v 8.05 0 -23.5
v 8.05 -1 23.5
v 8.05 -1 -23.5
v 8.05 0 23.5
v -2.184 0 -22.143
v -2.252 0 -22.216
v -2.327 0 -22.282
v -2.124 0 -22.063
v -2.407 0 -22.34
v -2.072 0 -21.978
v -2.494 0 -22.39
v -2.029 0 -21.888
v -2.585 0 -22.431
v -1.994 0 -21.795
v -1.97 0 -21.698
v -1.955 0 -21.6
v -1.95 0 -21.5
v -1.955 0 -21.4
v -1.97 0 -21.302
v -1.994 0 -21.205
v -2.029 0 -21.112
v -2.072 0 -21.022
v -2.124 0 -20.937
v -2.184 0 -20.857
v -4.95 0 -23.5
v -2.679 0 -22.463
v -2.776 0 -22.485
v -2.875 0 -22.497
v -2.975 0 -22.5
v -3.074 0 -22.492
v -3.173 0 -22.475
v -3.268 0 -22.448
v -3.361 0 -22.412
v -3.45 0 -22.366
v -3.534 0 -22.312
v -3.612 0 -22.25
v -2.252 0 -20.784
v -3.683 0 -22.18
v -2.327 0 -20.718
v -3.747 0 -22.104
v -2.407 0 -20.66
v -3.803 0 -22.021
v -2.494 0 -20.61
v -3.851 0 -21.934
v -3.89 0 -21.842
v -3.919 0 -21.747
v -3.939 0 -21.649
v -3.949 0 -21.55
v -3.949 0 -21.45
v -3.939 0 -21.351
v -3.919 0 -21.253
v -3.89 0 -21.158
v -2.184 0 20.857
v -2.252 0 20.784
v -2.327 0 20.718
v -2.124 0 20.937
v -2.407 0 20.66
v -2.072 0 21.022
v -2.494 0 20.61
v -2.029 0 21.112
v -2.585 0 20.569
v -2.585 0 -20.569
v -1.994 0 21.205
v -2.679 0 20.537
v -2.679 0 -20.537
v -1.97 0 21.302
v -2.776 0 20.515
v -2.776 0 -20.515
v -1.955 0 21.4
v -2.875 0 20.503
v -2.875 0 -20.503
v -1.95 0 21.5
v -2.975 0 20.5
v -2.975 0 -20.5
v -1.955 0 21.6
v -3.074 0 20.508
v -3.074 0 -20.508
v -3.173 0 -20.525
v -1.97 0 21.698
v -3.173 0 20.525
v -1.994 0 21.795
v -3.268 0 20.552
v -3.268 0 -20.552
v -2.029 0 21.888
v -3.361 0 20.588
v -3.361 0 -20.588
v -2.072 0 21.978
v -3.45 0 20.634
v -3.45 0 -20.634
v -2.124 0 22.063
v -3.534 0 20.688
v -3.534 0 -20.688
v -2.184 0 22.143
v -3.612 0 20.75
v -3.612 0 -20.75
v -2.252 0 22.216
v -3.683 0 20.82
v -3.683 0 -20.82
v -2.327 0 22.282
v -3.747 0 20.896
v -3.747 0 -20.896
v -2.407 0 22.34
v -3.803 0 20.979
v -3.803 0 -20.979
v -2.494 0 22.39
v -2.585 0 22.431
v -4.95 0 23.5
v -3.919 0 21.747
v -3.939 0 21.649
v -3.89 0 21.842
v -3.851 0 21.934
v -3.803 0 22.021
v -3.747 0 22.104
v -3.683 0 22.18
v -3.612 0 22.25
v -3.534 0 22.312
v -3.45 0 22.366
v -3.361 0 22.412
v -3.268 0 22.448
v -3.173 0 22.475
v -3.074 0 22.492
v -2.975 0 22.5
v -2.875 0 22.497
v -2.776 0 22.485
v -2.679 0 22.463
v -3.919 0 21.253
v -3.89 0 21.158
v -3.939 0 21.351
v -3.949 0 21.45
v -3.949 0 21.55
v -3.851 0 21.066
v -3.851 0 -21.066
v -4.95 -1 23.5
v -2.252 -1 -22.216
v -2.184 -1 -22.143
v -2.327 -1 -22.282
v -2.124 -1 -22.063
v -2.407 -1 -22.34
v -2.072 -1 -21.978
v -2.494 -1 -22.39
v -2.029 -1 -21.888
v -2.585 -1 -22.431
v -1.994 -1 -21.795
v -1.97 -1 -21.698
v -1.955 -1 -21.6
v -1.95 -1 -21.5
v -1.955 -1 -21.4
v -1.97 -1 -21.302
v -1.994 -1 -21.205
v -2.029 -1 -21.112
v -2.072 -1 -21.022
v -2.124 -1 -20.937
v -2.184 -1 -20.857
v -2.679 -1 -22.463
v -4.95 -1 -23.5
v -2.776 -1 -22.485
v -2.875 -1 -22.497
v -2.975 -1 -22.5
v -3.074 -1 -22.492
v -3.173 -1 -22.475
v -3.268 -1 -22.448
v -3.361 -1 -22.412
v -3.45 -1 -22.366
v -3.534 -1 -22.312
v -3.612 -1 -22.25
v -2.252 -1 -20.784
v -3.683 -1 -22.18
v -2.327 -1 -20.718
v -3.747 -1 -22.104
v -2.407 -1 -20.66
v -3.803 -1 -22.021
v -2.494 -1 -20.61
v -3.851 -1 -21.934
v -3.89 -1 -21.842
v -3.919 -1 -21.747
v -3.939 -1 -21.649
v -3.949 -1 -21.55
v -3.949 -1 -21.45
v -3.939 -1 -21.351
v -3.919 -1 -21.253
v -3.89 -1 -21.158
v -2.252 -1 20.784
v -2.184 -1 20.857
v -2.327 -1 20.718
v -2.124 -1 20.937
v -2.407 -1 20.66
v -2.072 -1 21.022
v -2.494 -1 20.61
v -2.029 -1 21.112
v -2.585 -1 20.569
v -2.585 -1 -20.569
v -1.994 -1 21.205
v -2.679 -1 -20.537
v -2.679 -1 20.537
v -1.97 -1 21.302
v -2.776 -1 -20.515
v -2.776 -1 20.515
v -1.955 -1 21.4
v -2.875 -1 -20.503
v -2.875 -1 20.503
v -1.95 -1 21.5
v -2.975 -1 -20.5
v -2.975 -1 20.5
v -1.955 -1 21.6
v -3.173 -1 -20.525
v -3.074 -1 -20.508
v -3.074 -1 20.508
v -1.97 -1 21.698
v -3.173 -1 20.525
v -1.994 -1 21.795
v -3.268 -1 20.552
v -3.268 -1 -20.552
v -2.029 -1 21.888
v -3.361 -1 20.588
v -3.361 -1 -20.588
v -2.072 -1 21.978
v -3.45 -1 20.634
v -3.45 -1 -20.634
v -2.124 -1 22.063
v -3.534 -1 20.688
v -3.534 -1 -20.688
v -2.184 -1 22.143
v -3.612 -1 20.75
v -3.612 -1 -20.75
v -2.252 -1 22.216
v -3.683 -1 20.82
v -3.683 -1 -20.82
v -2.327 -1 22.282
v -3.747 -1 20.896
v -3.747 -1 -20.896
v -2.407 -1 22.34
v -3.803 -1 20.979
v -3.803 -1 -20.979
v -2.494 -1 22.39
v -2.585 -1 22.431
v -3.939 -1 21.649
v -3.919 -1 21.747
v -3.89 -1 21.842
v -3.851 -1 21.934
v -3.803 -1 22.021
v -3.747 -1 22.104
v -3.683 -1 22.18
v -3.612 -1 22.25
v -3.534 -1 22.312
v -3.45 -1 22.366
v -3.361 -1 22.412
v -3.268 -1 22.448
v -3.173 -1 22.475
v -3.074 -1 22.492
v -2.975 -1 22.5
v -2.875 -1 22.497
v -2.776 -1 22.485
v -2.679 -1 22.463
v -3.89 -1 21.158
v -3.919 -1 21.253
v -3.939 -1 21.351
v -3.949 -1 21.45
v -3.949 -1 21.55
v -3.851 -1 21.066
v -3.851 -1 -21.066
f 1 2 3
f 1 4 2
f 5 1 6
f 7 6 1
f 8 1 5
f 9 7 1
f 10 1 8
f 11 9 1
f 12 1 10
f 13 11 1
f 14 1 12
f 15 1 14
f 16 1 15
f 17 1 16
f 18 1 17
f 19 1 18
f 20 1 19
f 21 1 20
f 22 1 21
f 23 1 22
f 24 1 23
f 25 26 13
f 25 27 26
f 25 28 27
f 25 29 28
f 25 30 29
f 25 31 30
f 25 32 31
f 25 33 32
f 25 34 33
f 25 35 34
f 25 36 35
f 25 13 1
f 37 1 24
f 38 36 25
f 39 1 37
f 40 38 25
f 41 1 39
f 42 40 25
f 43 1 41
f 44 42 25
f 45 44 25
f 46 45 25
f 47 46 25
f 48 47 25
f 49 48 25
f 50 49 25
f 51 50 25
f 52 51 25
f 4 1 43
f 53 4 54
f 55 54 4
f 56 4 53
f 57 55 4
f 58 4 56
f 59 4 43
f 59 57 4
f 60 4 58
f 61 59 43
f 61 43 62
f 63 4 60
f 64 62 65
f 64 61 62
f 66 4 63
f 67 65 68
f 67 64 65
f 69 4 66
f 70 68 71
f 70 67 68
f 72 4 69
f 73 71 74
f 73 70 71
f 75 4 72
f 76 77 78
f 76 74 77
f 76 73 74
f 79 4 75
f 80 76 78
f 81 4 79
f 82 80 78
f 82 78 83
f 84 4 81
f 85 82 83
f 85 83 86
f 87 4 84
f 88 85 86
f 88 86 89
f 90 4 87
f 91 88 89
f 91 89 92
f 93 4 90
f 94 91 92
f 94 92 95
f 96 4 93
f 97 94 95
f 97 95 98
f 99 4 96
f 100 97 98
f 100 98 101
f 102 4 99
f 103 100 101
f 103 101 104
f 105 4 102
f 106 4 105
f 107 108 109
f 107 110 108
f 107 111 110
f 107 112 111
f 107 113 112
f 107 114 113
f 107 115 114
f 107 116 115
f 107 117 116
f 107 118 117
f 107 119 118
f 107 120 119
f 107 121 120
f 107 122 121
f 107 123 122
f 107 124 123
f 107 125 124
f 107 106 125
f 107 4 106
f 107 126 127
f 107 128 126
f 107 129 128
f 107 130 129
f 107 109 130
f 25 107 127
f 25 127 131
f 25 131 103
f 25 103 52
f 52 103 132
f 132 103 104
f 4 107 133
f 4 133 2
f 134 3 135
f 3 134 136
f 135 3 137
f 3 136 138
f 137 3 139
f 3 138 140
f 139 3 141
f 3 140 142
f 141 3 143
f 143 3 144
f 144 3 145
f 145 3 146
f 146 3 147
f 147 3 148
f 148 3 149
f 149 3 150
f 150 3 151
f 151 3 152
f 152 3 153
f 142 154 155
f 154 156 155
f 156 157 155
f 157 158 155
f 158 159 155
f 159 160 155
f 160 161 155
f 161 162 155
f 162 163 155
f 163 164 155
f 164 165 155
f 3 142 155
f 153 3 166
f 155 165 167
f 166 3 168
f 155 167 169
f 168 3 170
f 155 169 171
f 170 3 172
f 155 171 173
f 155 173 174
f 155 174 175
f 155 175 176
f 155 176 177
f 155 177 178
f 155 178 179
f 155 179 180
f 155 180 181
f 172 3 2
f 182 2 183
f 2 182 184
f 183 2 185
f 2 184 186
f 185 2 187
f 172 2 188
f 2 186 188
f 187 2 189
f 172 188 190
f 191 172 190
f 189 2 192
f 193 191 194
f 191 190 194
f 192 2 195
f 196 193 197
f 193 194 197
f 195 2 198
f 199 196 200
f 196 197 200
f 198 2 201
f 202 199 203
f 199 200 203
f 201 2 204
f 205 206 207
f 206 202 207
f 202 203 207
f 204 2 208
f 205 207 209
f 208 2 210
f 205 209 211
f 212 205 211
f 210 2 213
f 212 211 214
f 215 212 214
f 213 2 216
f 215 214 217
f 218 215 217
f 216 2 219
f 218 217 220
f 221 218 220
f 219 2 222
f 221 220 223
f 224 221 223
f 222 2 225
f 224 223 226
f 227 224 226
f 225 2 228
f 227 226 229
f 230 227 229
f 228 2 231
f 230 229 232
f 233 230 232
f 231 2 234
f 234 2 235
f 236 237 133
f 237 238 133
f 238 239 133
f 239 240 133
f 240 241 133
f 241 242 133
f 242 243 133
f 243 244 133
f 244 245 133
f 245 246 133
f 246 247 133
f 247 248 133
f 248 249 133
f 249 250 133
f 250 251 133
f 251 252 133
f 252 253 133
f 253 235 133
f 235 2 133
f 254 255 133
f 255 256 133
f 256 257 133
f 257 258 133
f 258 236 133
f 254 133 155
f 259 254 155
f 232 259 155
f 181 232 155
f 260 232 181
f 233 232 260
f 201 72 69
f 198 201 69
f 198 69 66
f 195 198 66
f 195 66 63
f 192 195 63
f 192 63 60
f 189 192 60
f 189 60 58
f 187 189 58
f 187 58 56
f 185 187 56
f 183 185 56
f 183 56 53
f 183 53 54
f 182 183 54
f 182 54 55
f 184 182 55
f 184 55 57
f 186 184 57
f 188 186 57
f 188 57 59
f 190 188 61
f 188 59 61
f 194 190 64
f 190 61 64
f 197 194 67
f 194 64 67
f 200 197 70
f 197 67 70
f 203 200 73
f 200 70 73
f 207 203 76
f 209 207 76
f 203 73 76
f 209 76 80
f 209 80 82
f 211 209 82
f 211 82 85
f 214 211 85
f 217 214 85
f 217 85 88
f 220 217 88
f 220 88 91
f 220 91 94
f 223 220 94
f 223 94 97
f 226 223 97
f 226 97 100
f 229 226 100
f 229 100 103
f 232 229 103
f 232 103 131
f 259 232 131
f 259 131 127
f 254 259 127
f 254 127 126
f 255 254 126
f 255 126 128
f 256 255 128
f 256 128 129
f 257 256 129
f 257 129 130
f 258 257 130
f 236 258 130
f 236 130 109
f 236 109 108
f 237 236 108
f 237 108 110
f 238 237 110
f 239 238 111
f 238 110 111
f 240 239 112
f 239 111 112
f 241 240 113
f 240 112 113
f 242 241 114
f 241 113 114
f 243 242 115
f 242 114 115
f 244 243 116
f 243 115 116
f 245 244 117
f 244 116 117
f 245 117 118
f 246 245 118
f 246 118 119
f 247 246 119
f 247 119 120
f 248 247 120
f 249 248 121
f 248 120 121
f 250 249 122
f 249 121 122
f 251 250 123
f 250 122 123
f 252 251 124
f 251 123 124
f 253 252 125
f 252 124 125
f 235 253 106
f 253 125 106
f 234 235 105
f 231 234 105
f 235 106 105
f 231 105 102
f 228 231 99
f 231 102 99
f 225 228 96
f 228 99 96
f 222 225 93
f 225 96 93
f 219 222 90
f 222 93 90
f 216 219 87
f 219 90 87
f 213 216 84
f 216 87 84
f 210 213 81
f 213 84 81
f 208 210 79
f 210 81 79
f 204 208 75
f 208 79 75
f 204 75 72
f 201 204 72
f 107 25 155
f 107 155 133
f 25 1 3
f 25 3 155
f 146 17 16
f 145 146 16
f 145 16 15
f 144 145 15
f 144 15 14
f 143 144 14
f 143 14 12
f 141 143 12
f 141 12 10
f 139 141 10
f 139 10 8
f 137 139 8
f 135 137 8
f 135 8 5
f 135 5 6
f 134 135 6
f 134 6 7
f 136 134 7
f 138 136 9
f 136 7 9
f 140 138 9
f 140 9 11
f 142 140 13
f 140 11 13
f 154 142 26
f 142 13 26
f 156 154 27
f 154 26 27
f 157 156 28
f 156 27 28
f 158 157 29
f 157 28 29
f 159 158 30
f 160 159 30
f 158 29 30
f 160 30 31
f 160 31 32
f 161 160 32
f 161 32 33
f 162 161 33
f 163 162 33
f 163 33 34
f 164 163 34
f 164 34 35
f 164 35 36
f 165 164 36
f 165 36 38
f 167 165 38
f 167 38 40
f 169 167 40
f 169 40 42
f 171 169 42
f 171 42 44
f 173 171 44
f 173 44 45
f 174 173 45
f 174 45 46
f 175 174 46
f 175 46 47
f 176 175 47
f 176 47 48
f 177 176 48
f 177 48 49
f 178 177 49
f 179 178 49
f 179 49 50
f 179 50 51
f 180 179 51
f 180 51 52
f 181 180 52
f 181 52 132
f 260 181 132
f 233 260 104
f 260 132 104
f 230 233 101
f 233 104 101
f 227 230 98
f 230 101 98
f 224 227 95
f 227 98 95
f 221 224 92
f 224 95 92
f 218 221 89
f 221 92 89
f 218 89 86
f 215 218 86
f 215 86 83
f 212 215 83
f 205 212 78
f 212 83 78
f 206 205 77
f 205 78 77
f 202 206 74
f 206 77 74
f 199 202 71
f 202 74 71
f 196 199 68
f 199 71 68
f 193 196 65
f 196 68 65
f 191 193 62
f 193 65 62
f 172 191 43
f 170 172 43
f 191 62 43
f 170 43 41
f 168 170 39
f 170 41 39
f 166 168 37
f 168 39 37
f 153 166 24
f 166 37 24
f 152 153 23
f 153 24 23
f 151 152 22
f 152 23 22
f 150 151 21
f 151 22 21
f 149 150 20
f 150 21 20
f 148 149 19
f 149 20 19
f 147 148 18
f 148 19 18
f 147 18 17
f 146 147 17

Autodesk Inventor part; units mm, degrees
ref_plane "YZ Plane" through (0, 0, 0) normal (1, 0, 0) x (0, 1, 0)
ref_plane "XZ Plane" through (0, 0, 0) normal (0, 1, 0) x (-1, 0, 0)
ref_plane "XY Plane" through (0, 0, 0) normal (0, 0, 1) x (1, 0, 0)
sketch "スケッチ1" plane through (0, 0, 0) normal (0, 1, 0) x (-1, 0, 0)
  line L0 (4.95, 23.5) -> (-8.05, 23.5)
  line L1 (-8.05, 23.5) -> (-8.05, -23.5)
  line L2 (-8.05, -23.5) -> (4.95, -23.5)
  line L3 (4.95, -23.5) -> (4.95, 23.5)
  point P0 (0, 0)
  dimension "d12" = 4.95
  dimension "d13" = 8.05
  dimension "d14" = 47
  dimension "d15" = 23.5
extrude "押し出し1" add sketch "スケッチ1" against normal blind 1
sketch "スケッチ2" plane through (0, 0, 0) normal (0, 1, 0) x (1, 0, 0)
  circle A0 centre (-2.95, 21.5) radius 1
  line L0 (8.05, -23.5) -> (8.05, 23.5) projected
  line L1 (8.05, 23.5) -> (-4.95, 23.5) projected
  circle A1 centre (-2.95, -21.5) radius 1
  line L2 (-4.95, -23.5) -> (8.05, -23.5) projected
  point P0 (0, 0)
  dimension "d4" = 2
  dimension "d5" = 11
  dimension "d6" = 2
  dimension "d7" = 2
  dimension "d8" = 11
  dimension "d9" = 2
extrude "押し出し2" cut sketch "スケッチ2" against normal blind 1
equation "\"d7\" = d4"
equation "\"d8\" = d5"
equation "\"d9\" = d6"
properties part number "kiban"
